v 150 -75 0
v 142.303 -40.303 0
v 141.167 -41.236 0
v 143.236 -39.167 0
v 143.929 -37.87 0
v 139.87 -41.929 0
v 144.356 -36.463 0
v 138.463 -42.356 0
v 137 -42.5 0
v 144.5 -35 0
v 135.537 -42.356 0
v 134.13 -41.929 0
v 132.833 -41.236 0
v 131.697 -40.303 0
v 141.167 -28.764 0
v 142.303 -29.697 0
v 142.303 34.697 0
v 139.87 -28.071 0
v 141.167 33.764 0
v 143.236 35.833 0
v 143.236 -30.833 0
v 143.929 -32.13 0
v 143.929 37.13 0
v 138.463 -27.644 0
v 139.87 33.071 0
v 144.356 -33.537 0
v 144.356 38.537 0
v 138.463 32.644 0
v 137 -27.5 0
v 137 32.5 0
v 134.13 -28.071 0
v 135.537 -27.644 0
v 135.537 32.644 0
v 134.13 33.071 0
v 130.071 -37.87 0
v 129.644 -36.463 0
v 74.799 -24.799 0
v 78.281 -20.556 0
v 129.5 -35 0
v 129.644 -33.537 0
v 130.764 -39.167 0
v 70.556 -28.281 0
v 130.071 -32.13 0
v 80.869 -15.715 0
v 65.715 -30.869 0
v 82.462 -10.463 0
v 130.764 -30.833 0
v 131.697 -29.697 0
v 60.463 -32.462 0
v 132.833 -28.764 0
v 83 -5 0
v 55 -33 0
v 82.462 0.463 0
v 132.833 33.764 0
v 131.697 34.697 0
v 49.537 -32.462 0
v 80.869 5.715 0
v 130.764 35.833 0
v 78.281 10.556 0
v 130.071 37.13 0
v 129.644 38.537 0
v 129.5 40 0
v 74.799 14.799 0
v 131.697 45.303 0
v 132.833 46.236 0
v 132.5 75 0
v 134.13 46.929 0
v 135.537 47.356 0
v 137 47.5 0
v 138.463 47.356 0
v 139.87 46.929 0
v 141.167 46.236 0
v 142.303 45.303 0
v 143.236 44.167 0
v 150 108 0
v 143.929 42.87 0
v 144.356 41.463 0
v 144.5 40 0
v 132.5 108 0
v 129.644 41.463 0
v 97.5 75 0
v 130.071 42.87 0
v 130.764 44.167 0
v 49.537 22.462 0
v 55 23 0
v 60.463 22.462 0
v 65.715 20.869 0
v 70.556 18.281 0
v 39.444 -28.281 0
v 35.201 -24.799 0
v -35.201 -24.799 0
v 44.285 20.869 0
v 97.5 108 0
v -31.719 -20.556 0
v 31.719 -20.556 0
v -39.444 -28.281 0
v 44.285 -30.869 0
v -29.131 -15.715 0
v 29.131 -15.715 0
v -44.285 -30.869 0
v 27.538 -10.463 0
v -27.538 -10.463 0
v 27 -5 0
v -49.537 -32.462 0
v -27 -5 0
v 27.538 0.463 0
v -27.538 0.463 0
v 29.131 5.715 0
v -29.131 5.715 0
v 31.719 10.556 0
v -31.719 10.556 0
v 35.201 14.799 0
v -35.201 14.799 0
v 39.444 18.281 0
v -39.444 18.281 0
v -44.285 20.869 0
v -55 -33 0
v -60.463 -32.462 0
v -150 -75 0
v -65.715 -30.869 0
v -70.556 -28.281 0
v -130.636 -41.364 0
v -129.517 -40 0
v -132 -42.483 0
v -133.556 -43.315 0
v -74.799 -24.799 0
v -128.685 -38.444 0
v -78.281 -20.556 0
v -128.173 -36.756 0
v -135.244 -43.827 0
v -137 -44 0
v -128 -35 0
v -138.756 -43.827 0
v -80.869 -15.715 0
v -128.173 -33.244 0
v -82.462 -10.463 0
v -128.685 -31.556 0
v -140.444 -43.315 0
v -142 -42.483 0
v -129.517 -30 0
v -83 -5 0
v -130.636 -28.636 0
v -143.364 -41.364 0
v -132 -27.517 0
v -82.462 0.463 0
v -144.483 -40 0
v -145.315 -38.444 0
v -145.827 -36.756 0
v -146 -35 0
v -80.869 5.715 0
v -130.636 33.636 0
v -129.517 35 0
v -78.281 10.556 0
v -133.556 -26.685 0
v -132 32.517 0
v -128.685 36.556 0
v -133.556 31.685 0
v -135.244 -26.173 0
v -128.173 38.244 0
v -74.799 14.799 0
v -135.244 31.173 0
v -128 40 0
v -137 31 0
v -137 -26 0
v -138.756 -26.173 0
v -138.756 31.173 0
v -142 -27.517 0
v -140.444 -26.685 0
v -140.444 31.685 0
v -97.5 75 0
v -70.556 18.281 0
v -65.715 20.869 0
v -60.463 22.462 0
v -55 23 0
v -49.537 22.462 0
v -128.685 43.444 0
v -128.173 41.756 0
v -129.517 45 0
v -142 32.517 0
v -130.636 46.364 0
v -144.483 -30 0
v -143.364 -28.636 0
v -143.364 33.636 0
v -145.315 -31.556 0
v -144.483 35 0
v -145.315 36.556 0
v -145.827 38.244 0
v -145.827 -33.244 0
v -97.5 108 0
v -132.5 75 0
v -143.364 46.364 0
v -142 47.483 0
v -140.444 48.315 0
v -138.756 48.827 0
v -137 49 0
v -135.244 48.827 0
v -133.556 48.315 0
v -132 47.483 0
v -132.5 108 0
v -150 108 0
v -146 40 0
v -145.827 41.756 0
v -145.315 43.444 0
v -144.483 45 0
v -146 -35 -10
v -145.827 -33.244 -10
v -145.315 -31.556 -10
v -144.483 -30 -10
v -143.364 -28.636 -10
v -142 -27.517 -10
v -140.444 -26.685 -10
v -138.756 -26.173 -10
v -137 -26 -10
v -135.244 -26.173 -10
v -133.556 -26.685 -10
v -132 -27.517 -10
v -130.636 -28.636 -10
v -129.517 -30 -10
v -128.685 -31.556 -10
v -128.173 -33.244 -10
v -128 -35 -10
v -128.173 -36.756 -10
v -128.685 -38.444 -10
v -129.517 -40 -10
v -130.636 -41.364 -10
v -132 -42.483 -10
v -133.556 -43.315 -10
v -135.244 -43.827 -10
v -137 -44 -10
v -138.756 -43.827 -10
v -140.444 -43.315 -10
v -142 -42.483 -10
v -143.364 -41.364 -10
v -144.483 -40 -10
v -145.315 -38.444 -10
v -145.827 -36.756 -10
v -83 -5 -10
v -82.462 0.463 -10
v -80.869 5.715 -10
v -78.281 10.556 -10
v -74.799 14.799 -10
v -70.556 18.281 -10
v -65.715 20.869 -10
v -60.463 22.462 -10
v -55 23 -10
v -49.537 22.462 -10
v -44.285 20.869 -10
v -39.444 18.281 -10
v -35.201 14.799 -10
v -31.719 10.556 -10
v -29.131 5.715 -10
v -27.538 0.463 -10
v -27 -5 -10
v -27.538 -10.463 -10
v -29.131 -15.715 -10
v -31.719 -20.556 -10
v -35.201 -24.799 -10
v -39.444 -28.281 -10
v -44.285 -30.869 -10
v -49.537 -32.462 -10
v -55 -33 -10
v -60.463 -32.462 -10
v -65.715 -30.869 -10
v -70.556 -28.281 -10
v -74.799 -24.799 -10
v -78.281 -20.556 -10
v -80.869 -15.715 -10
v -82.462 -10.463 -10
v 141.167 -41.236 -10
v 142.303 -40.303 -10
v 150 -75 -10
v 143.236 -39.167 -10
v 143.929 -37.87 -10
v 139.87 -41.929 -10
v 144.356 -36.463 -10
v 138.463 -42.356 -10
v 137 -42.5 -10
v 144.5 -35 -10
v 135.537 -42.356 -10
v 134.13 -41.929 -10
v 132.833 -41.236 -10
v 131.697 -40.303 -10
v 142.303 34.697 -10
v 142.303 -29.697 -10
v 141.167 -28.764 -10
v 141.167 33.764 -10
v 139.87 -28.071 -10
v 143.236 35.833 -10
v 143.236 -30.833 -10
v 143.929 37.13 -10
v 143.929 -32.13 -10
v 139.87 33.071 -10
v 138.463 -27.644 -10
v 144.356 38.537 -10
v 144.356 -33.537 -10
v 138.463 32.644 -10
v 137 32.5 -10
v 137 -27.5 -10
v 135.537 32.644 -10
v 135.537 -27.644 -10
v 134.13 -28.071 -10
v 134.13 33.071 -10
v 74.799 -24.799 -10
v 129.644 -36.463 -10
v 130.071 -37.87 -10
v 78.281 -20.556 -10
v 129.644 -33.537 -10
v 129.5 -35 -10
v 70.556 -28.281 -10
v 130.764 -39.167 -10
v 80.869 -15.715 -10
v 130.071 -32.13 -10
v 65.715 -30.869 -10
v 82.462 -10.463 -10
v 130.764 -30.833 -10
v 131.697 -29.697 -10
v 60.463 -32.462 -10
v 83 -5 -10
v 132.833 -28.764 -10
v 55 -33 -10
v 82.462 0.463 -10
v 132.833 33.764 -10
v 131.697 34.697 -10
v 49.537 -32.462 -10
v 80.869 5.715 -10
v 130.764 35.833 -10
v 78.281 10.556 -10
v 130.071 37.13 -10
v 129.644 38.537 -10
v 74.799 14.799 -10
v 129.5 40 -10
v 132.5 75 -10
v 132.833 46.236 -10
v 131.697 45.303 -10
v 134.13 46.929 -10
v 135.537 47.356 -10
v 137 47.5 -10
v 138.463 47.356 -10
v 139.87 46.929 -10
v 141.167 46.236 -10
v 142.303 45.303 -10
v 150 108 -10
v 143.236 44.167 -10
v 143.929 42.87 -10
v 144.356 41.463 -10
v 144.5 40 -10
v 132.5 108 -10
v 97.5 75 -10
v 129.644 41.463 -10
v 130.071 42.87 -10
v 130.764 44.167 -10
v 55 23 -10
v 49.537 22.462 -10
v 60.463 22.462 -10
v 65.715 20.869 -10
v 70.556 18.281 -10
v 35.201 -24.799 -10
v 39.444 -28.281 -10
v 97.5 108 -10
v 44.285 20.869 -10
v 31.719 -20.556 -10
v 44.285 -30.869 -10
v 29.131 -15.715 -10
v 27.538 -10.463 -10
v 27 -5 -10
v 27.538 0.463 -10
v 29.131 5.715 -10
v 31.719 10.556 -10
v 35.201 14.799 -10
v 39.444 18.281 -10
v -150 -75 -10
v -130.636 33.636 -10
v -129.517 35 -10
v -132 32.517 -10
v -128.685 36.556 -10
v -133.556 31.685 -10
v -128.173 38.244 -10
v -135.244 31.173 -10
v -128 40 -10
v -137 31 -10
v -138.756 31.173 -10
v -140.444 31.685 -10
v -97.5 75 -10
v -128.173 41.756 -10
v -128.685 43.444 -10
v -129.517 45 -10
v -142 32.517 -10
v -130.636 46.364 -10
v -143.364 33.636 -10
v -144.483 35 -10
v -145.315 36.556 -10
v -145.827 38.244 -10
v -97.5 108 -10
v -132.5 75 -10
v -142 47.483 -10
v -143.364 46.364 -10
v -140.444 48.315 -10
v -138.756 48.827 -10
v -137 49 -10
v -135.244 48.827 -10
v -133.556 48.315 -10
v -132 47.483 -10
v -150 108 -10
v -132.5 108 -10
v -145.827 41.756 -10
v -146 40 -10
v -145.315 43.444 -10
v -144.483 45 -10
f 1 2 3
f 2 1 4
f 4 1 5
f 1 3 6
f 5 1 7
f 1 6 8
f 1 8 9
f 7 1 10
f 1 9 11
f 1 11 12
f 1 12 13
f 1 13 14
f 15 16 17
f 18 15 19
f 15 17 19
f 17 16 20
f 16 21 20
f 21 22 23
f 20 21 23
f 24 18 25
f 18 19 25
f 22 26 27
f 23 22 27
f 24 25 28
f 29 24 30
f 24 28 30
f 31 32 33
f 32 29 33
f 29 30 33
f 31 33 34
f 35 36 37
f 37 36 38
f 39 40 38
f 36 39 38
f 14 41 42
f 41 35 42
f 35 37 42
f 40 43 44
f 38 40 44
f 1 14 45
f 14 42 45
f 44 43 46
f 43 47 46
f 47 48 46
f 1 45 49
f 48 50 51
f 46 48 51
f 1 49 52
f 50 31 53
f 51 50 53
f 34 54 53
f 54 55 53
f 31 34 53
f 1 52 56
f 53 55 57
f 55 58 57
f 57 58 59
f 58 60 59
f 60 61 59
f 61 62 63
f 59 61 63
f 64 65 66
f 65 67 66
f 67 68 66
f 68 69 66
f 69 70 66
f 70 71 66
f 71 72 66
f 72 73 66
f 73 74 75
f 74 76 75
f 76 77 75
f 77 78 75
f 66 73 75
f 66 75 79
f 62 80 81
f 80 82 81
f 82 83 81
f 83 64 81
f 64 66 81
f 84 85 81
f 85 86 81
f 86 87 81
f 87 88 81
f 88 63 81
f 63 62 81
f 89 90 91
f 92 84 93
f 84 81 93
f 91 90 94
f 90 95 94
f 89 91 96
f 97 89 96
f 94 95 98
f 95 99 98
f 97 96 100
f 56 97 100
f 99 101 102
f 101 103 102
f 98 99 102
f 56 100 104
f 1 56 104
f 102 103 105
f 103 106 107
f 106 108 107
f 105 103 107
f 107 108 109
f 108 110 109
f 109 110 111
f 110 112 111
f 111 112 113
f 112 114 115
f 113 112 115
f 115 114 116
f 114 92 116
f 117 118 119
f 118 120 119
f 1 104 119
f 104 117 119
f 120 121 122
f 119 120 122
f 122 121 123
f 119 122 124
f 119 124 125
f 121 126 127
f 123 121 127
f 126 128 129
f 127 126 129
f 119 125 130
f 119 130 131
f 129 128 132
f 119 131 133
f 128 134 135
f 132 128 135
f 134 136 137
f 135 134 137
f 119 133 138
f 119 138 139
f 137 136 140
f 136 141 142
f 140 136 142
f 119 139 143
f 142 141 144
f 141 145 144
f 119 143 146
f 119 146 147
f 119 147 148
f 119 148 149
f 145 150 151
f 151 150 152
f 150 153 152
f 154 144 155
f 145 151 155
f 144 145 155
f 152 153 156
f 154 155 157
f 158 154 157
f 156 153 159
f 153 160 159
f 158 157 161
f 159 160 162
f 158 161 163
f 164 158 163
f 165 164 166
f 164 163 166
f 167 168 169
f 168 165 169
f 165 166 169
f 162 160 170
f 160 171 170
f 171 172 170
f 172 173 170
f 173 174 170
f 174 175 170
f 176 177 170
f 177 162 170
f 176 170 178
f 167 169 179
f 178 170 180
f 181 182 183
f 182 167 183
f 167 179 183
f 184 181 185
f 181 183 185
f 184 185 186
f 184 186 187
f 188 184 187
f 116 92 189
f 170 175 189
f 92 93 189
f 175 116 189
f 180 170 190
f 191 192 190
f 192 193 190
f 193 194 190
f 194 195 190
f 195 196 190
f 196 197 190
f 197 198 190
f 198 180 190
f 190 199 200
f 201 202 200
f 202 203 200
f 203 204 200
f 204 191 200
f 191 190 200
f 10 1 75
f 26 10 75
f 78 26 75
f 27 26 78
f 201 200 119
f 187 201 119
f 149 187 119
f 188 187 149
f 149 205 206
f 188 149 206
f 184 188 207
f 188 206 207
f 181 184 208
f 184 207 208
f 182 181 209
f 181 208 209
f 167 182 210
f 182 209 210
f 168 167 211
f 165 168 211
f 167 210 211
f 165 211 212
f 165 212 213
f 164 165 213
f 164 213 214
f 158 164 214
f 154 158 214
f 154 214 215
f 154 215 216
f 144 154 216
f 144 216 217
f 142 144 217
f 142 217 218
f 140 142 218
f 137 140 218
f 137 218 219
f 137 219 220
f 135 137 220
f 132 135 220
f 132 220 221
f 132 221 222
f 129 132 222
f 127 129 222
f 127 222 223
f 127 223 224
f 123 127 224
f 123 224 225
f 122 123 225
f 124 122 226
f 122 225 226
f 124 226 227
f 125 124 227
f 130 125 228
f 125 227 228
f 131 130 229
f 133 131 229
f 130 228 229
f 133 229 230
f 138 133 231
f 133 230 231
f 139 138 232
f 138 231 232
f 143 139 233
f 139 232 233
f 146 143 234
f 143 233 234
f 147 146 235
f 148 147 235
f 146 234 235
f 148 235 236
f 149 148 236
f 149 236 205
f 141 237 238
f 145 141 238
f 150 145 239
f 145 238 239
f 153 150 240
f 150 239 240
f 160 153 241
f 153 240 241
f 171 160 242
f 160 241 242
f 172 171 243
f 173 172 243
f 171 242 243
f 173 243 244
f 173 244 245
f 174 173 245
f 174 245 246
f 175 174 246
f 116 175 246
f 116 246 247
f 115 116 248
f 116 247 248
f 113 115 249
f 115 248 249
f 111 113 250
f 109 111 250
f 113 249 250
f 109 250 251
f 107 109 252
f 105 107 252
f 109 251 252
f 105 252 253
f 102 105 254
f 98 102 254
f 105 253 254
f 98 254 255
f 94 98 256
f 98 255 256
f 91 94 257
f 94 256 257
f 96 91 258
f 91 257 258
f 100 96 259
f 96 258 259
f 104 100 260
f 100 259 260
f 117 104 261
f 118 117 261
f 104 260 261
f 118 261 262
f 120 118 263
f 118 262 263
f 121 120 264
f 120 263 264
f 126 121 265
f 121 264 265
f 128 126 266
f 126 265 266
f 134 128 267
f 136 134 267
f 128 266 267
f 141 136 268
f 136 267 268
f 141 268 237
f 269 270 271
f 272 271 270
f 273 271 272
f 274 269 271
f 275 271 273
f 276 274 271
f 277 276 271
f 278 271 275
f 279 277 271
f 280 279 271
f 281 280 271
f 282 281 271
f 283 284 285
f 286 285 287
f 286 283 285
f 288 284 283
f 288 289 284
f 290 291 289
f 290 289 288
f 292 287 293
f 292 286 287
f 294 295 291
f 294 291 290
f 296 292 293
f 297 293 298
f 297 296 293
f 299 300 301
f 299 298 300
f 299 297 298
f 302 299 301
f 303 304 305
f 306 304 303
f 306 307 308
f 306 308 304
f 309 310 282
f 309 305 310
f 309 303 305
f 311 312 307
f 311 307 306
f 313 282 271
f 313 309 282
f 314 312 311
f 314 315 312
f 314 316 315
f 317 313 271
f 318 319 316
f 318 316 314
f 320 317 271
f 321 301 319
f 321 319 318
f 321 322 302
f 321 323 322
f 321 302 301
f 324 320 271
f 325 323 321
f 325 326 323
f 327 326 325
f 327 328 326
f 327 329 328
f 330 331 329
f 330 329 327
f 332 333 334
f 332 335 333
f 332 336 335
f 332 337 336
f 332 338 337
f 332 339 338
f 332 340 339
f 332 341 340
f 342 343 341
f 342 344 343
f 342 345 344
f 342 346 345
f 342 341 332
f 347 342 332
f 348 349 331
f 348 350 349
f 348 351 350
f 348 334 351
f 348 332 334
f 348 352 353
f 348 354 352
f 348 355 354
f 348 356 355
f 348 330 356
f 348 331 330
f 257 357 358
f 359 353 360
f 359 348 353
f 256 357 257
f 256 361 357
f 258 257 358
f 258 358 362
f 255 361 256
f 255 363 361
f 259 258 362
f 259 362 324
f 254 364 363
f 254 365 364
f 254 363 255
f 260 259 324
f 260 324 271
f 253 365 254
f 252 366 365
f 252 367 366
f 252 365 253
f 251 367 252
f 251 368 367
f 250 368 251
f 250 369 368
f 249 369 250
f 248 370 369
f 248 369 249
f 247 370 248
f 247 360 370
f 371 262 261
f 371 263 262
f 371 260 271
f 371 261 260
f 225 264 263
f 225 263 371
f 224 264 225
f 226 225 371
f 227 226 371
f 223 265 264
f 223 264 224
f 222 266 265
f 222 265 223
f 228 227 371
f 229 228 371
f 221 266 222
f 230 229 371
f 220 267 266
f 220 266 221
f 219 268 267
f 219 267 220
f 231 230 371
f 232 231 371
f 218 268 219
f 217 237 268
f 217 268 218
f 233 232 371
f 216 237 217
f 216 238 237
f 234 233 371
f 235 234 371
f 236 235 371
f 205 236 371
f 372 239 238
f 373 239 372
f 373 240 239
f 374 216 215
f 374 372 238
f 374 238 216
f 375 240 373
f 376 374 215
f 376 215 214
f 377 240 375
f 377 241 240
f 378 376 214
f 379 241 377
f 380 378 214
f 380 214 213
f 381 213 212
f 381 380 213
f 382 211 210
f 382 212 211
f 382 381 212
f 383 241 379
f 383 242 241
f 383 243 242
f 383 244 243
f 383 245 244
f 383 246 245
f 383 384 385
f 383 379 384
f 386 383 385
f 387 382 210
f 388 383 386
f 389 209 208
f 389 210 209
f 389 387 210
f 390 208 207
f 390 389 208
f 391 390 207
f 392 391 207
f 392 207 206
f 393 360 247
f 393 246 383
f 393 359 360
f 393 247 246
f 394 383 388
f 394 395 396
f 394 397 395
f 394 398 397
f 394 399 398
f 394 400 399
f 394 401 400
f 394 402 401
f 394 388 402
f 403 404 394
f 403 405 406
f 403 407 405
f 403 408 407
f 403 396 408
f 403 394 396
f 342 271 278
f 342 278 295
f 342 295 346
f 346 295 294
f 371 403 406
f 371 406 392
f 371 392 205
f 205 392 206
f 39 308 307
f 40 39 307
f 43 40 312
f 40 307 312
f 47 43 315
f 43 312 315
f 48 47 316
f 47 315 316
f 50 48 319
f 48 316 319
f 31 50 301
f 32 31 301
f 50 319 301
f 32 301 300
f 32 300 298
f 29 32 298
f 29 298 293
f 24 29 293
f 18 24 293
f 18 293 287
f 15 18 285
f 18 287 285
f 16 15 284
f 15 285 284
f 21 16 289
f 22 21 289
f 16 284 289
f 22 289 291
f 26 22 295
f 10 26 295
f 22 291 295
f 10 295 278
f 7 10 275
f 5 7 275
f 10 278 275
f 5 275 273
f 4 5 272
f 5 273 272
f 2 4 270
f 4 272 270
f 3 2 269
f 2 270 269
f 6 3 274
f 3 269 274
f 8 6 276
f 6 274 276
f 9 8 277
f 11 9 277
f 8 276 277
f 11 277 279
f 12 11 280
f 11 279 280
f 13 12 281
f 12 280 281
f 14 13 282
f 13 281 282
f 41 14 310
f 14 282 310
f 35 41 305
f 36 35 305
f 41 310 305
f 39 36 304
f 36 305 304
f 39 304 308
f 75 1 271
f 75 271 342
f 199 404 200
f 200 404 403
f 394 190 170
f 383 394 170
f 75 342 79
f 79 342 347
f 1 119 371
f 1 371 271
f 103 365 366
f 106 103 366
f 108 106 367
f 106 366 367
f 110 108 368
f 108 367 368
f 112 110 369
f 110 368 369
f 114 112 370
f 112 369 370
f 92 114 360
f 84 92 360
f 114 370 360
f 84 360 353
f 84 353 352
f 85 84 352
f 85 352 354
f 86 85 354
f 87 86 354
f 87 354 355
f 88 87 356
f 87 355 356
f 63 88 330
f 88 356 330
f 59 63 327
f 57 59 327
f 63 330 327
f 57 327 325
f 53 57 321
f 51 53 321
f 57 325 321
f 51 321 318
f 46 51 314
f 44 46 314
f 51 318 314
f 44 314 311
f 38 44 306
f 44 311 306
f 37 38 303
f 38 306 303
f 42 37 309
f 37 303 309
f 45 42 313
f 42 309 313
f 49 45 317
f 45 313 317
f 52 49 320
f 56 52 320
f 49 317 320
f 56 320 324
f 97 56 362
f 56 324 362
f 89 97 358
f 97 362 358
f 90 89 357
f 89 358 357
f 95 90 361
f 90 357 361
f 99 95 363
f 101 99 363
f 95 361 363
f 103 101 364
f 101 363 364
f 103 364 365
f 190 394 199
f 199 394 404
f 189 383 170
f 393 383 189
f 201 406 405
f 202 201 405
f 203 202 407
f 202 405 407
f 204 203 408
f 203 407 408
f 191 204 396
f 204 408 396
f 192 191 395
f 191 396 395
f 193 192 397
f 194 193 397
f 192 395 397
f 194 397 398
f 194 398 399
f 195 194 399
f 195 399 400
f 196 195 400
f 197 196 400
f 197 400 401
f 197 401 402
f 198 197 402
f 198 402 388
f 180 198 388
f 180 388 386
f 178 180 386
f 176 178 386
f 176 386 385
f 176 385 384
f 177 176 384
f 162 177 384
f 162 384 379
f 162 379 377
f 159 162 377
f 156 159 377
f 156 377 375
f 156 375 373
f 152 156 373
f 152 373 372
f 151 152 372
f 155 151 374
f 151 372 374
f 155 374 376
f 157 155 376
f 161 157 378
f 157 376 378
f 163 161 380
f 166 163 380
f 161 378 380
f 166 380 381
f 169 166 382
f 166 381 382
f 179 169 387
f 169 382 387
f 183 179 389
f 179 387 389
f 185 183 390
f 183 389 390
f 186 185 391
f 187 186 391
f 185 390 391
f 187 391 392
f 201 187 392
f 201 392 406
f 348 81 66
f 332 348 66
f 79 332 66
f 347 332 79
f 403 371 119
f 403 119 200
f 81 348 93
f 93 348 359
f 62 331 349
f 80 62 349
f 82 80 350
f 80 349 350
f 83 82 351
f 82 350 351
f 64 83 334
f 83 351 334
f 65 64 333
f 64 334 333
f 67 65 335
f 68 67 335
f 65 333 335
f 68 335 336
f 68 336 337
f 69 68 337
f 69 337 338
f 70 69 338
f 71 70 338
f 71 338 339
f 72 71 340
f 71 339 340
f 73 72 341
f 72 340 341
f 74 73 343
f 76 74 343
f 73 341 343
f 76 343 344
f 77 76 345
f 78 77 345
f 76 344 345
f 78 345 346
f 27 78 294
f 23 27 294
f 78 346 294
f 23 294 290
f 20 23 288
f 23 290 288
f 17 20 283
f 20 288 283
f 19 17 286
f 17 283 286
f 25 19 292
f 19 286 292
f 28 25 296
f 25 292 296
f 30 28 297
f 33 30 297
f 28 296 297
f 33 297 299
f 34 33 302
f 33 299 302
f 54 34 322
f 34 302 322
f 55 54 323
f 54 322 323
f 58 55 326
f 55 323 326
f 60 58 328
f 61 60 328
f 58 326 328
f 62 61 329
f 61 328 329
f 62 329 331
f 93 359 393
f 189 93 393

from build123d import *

# Parameters (mm, degrees)
IZIM1_W               = 300
IZIM1_H               = 150
TABAN_FLAN_1_DEPTH    = 10
IZIM2_R               = 28
KES_EKSTR_ZYON1_DEPTH = 10
IZIM3_R               = 7.5
KES_EKSTR_ZYON2_DEPTH = 10
IZIM4_R               = 7.5
KES_EKSTR_ZYON3_DEPTH = 10
IZIM5_R               = 9
KES_EKSTR_ZYON4_DEPTH = 169.002976164
IZIM8_W               = 17.5
IZIM8_H               = 33
IZIM8_W_2             = 195
SEKME1_DEPTH          = 10


# Sheet-metal steps are written as plain solids
with BuildPart() as part:
    # Çizim1 → Taban-Flanş1 (new body)
    with BuildSketch(Plane.XY):
        Rectangle(IZIM1_W, IZIM1_H)
    extrude(amount=-TABAN_FLAN_1_DEPTH)

    # Çizim2 → Kes-Ekstrüzyon1 (cut)
    with BuildSketch(Plane(origin=(0, 0, -10), x_dir=(-1, 0, 0), z_dir=(0, 0, -1))):
        with Locations((-55, -5)):
            Circle(IZIM2_R)
        with Locations((55, -5)):
            Circle(IZIM2_R)
    extrude(amount=-KES_EKSTR_ZYON1_DEPTH, mode=Mode.SUBTRACT)

    # Çizim3 → Kes-Ekstrüzyon2 (cut)
    with BuildSketch(Plane(origin=(0, 0, -10), x_dir=(-1, 0, 0), z_dir=(0, 0, -1))):
        with Locations((-137, -35)):
            Circle(IZIM3_R)
        with Locations((-137, 40)):
            Circle(IZIM3_R)
    extrude(amount=-KES_EKSTR_ZYON2_DEPTH, mode=Mode.SUBTRACT)

    # Çizim4 → Kes-Ekstrüzyon3 (cut)
    with BuildSketch(Plane(origin=(0, 0, -10), x_dir=(-1, 0, 0), z_dir=(0, 0, -1))):
        with Locations((137, -35)):
            Circle(IZIM4_R)
        with Locations((137, 40)):
            Circle(IZIM4_R)
    extrude(amount=-KES_EKSTR_ZYON3_DEPTH, mode=Mode.SUBTRACT)

    # Çizim5 → Kes-Ekstrüzyon4 (cut, through all)
    with BuildSketch(Plane(origin=(0, 0, -10), x_dir=(-1, 0, 0), z_dir=(0, 0, -1))):
        with Locations((137, -35)):
            Circle(IZIM5_R)
        with Locations((137, 40)):
            Circle(IZIM5_R)
    extrude(amount=-KES_EKSTR_ZYON4_DEPTH, mode=Mode.SUBTRACT)

    # Çizim8 → Sekme1 (add)
    with BuildSketch(Plane(origin=(0, 0, -10), x_dir=(-1, 0, 0), z_dir=(0, 0, -1))):
        with Locations((141.25, 91.5)):
            Rectangle(IZIM8_W, IZIM8_H)
        with Locations((0, 91.5)):
            Rectangle(IZIM8_W_2, IZIM8_H)
        with Locations((-141.25, 91.5)):
            Rectangle(IZIM8_W, IZIM8_H)
    extrude(amount=-SEKME1_DEPTH)


solid = part.part
